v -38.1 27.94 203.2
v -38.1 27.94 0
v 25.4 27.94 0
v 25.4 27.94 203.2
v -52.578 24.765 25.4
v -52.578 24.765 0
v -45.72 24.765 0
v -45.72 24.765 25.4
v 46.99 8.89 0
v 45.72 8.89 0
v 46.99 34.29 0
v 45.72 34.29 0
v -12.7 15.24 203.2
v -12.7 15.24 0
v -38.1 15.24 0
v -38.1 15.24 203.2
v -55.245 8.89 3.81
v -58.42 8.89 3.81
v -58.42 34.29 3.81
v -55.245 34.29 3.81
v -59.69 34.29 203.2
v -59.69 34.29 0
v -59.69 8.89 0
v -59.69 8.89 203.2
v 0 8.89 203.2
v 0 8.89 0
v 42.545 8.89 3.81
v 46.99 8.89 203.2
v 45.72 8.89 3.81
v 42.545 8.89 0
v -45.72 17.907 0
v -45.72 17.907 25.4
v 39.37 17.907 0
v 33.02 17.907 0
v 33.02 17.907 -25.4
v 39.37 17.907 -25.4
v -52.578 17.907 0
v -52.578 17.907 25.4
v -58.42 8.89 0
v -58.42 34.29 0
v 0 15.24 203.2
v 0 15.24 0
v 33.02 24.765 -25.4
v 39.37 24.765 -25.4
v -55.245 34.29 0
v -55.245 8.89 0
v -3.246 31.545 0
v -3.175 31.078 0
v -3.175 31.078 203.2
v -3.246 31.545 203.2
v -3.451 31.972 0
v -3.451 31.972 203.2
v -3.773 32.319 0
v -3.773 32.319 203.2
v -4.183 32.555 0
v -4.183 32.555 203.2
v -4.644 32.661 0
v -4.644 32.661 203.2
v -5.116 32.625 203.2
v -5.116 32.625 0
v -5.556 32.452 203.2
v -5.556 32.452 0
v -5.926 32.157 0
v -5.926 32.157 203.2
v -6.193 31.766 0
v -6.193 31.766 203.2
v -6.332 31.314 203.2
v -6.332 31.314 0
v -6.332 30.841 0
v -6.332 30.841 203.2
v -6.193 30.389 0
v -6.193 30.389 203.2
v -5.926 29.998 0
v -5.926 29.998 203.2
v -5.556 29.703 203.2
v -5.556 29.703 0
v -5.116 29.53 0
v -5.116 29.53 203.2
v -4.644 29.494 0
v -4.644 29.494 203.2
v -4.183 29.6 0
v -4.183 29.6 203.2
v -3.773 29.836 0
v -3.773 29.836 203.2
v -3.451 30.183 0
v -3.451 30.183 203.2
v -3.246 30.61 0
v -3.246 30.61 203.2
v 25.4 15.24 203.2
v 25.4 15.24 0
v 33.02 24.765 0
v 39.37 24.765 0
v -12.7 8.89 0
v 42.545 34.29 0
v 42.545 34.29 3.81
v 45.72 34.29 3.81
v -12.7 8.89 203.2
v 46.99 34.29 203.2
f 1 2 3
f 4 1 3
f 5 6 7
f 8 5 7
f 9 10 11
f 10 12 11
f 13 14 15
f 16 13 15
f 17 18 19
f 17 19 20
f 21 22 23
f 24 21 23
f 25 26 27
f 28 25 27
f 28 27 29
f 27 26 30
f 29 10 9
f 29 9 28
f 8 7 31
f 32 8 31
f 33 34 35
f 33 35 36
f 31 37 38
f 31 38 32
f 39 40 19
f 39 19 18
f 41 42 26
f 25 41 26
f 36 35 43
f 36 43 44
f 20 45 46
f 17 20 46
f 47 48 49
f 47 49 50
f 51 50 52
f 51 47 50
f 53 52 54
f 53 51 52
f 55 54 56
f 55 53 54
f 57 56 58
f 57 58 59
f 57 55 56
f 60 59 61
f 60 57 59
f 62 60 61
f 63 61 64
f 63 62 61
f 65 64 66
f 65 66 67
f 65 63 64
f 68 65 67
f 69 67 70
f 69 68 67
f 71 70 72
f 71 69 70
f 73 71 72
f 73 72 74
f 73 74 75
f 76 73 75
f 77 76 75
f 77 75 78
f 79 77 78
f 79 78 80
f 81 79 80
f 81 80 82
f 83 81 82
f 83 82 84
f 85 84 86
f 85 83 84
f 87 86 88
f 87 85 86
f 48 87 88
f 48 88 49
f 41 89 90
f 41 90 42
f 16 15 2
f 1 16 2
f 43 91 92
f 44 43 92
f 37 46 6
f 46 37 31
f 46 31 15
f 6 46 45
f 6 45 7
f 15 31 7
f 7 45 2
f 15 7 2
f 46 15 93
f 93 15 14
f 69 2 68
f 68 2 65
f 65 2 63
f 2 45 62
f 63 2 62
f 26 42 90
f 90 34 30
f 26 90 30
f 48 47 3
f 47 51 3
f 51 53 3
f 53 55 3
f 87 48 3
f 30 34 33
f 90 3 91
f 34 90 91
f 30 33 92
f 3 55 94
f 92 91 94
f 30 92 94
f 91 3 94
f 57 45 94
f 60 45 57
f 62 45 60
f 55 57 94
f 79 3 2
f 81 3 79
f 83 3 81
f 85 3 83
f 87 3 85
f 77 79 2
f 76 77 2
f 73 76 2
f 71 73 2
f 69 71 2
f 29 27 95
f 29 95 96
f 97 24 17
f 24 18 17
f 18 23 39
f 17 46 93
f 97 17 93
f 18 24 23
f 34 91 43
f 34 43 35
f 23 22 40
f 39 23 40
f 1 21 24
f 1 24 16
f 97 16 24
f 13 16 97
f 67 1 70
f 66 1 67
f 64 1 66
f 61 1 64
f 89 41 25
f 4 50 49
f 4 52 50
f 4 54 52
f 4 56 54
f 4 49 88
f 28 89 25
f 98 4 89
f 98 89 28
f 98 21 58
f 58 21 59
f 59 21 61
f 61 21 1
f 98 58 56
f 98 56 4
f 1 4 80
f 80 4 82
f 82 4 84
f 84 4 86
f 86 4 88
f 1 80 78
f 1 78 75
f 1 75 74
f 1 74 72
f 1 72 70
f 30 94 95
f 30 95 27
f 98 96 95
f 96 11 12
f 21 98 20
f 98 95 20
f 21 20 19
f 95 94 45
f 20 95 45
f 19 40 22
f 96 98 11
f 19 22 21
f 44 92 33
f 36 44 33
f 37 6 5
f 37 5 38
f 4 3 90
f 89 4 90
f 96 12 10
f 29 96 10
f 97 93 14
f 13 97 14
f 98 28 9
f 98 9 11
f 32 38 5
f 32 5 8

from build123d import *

# Parameters (mm, degrees)
F0_R      = 1.5875
F1_DEPTH  = 203.2
F2_W      = 3.81
F2_H      = 4.445
F3_DEPTH  = 25.4
F5_DEPTH  = 25.4
F6_W      = 6.858
F6_H      = 6.858
F7_DEPTH  = 25.4
F6_W_2    = 6.35
F8_DEPTH  = 25.4
F9_W      = 3.175
F9_H      = 25.4
F10_DEPTH = 3.81
F11_W     = 3.175
F11_H     = 25.4
F12_DEPTH = 3.81


with BuildPart() as f1:
    # F0 (on Top) → F1 (new body)
    with BuildSketch(Plane.XY):
        Polygon((46.99, 34.29), (-59.69, 34.29), (-59.69, 8.89), (-12.7, 8.89), (-12.7, 15.24), (-38.1, 15.24), (-38.1, 27.94), (25.4, 27.94), (25.4, 15.24), (0, 15.24), (0, 8.89), (46.99, 8.89), align=None)
        with Locations((-4.7625, 31.077515)):
            Circle(F0_R, mode=Mode.SUBTRACT)
    extrude(amount=F1_DEPTH)

    # F2 (on face) → F3 (cut)
    with BuildSketch(Plane(origin=(0, 34.29, 0), x_dir=(-1, 0, 0), z_dir=(0, 1, 0))):
        with Locations((56.515, 205.4225)):
            Rectangle(F2_W, F2_H)
    extrude(amount=-F3_DEPTH, mode=Mode.SUBTRACT)

    # F4 (on face) → F5 (cut)
    with BuildSketch(Plane(origin=(0, 34.29, 0), x_dir=(-1, 0, 0), z_dir=(0, 1, 0))):
        Polygon((-41.91, 207.644923), (-45.72, 207.644923), (-45.72, 203.2), (-41.928444, 203.2), align=None)
    extrude(amount=-F5_DEPTH, mode=Mode.SUBTRACT)

    # F6 (on face) → F7 (cut)
    with BuildSketch(Plane(origin=(0, 0, 0), x_dir=(1, 0, 0), z_dir=(0, 0, -1))):
        with Locations((-49.149, -21.336)):
            Rectangle(F6_W, F6_H)
    extrude(amount=-F7_DEPTH, mode=Mode.SUBTRACT)

    # F6 (on face) → F8 (join)
    with BuildSketch(Plane(origin=(0, 0, 0), x_dir=(1, 0, 0), z_dir=(0, 0, -1))):
        with Locations((36.195, -21.336)):
            Rectangle(F6_W_2, F6_H)
    extrude(amount=F8_DEPTH)

    # F9 (on face) → F10 (cut)
    with BuildSketch(Plane(origin=(0, 0, 0), x_dir=(1, 0, 0), z_dir=(0, 0, -1))):
        with Locations((-56.8325, -21.59)):
            Rectangle(F9_W, F9_H)
    extrude(amount=-F10_DEPTH, mode=Mode.SUBTRACT)

    # F11 (on face) → F12 (cut)
    with BuildSketch(Plane(origin=(0, 0, 0), x_dir=(1, 0, 0), z_dir=(0, 0, -1))):
        with Locations((44.1325, -21.59)):
            Rectangle(F11_W, F11_H)
    extrude(amount=-F12_DEPTH, mode=Mode.SUBTRACT)


solid = f1.part
